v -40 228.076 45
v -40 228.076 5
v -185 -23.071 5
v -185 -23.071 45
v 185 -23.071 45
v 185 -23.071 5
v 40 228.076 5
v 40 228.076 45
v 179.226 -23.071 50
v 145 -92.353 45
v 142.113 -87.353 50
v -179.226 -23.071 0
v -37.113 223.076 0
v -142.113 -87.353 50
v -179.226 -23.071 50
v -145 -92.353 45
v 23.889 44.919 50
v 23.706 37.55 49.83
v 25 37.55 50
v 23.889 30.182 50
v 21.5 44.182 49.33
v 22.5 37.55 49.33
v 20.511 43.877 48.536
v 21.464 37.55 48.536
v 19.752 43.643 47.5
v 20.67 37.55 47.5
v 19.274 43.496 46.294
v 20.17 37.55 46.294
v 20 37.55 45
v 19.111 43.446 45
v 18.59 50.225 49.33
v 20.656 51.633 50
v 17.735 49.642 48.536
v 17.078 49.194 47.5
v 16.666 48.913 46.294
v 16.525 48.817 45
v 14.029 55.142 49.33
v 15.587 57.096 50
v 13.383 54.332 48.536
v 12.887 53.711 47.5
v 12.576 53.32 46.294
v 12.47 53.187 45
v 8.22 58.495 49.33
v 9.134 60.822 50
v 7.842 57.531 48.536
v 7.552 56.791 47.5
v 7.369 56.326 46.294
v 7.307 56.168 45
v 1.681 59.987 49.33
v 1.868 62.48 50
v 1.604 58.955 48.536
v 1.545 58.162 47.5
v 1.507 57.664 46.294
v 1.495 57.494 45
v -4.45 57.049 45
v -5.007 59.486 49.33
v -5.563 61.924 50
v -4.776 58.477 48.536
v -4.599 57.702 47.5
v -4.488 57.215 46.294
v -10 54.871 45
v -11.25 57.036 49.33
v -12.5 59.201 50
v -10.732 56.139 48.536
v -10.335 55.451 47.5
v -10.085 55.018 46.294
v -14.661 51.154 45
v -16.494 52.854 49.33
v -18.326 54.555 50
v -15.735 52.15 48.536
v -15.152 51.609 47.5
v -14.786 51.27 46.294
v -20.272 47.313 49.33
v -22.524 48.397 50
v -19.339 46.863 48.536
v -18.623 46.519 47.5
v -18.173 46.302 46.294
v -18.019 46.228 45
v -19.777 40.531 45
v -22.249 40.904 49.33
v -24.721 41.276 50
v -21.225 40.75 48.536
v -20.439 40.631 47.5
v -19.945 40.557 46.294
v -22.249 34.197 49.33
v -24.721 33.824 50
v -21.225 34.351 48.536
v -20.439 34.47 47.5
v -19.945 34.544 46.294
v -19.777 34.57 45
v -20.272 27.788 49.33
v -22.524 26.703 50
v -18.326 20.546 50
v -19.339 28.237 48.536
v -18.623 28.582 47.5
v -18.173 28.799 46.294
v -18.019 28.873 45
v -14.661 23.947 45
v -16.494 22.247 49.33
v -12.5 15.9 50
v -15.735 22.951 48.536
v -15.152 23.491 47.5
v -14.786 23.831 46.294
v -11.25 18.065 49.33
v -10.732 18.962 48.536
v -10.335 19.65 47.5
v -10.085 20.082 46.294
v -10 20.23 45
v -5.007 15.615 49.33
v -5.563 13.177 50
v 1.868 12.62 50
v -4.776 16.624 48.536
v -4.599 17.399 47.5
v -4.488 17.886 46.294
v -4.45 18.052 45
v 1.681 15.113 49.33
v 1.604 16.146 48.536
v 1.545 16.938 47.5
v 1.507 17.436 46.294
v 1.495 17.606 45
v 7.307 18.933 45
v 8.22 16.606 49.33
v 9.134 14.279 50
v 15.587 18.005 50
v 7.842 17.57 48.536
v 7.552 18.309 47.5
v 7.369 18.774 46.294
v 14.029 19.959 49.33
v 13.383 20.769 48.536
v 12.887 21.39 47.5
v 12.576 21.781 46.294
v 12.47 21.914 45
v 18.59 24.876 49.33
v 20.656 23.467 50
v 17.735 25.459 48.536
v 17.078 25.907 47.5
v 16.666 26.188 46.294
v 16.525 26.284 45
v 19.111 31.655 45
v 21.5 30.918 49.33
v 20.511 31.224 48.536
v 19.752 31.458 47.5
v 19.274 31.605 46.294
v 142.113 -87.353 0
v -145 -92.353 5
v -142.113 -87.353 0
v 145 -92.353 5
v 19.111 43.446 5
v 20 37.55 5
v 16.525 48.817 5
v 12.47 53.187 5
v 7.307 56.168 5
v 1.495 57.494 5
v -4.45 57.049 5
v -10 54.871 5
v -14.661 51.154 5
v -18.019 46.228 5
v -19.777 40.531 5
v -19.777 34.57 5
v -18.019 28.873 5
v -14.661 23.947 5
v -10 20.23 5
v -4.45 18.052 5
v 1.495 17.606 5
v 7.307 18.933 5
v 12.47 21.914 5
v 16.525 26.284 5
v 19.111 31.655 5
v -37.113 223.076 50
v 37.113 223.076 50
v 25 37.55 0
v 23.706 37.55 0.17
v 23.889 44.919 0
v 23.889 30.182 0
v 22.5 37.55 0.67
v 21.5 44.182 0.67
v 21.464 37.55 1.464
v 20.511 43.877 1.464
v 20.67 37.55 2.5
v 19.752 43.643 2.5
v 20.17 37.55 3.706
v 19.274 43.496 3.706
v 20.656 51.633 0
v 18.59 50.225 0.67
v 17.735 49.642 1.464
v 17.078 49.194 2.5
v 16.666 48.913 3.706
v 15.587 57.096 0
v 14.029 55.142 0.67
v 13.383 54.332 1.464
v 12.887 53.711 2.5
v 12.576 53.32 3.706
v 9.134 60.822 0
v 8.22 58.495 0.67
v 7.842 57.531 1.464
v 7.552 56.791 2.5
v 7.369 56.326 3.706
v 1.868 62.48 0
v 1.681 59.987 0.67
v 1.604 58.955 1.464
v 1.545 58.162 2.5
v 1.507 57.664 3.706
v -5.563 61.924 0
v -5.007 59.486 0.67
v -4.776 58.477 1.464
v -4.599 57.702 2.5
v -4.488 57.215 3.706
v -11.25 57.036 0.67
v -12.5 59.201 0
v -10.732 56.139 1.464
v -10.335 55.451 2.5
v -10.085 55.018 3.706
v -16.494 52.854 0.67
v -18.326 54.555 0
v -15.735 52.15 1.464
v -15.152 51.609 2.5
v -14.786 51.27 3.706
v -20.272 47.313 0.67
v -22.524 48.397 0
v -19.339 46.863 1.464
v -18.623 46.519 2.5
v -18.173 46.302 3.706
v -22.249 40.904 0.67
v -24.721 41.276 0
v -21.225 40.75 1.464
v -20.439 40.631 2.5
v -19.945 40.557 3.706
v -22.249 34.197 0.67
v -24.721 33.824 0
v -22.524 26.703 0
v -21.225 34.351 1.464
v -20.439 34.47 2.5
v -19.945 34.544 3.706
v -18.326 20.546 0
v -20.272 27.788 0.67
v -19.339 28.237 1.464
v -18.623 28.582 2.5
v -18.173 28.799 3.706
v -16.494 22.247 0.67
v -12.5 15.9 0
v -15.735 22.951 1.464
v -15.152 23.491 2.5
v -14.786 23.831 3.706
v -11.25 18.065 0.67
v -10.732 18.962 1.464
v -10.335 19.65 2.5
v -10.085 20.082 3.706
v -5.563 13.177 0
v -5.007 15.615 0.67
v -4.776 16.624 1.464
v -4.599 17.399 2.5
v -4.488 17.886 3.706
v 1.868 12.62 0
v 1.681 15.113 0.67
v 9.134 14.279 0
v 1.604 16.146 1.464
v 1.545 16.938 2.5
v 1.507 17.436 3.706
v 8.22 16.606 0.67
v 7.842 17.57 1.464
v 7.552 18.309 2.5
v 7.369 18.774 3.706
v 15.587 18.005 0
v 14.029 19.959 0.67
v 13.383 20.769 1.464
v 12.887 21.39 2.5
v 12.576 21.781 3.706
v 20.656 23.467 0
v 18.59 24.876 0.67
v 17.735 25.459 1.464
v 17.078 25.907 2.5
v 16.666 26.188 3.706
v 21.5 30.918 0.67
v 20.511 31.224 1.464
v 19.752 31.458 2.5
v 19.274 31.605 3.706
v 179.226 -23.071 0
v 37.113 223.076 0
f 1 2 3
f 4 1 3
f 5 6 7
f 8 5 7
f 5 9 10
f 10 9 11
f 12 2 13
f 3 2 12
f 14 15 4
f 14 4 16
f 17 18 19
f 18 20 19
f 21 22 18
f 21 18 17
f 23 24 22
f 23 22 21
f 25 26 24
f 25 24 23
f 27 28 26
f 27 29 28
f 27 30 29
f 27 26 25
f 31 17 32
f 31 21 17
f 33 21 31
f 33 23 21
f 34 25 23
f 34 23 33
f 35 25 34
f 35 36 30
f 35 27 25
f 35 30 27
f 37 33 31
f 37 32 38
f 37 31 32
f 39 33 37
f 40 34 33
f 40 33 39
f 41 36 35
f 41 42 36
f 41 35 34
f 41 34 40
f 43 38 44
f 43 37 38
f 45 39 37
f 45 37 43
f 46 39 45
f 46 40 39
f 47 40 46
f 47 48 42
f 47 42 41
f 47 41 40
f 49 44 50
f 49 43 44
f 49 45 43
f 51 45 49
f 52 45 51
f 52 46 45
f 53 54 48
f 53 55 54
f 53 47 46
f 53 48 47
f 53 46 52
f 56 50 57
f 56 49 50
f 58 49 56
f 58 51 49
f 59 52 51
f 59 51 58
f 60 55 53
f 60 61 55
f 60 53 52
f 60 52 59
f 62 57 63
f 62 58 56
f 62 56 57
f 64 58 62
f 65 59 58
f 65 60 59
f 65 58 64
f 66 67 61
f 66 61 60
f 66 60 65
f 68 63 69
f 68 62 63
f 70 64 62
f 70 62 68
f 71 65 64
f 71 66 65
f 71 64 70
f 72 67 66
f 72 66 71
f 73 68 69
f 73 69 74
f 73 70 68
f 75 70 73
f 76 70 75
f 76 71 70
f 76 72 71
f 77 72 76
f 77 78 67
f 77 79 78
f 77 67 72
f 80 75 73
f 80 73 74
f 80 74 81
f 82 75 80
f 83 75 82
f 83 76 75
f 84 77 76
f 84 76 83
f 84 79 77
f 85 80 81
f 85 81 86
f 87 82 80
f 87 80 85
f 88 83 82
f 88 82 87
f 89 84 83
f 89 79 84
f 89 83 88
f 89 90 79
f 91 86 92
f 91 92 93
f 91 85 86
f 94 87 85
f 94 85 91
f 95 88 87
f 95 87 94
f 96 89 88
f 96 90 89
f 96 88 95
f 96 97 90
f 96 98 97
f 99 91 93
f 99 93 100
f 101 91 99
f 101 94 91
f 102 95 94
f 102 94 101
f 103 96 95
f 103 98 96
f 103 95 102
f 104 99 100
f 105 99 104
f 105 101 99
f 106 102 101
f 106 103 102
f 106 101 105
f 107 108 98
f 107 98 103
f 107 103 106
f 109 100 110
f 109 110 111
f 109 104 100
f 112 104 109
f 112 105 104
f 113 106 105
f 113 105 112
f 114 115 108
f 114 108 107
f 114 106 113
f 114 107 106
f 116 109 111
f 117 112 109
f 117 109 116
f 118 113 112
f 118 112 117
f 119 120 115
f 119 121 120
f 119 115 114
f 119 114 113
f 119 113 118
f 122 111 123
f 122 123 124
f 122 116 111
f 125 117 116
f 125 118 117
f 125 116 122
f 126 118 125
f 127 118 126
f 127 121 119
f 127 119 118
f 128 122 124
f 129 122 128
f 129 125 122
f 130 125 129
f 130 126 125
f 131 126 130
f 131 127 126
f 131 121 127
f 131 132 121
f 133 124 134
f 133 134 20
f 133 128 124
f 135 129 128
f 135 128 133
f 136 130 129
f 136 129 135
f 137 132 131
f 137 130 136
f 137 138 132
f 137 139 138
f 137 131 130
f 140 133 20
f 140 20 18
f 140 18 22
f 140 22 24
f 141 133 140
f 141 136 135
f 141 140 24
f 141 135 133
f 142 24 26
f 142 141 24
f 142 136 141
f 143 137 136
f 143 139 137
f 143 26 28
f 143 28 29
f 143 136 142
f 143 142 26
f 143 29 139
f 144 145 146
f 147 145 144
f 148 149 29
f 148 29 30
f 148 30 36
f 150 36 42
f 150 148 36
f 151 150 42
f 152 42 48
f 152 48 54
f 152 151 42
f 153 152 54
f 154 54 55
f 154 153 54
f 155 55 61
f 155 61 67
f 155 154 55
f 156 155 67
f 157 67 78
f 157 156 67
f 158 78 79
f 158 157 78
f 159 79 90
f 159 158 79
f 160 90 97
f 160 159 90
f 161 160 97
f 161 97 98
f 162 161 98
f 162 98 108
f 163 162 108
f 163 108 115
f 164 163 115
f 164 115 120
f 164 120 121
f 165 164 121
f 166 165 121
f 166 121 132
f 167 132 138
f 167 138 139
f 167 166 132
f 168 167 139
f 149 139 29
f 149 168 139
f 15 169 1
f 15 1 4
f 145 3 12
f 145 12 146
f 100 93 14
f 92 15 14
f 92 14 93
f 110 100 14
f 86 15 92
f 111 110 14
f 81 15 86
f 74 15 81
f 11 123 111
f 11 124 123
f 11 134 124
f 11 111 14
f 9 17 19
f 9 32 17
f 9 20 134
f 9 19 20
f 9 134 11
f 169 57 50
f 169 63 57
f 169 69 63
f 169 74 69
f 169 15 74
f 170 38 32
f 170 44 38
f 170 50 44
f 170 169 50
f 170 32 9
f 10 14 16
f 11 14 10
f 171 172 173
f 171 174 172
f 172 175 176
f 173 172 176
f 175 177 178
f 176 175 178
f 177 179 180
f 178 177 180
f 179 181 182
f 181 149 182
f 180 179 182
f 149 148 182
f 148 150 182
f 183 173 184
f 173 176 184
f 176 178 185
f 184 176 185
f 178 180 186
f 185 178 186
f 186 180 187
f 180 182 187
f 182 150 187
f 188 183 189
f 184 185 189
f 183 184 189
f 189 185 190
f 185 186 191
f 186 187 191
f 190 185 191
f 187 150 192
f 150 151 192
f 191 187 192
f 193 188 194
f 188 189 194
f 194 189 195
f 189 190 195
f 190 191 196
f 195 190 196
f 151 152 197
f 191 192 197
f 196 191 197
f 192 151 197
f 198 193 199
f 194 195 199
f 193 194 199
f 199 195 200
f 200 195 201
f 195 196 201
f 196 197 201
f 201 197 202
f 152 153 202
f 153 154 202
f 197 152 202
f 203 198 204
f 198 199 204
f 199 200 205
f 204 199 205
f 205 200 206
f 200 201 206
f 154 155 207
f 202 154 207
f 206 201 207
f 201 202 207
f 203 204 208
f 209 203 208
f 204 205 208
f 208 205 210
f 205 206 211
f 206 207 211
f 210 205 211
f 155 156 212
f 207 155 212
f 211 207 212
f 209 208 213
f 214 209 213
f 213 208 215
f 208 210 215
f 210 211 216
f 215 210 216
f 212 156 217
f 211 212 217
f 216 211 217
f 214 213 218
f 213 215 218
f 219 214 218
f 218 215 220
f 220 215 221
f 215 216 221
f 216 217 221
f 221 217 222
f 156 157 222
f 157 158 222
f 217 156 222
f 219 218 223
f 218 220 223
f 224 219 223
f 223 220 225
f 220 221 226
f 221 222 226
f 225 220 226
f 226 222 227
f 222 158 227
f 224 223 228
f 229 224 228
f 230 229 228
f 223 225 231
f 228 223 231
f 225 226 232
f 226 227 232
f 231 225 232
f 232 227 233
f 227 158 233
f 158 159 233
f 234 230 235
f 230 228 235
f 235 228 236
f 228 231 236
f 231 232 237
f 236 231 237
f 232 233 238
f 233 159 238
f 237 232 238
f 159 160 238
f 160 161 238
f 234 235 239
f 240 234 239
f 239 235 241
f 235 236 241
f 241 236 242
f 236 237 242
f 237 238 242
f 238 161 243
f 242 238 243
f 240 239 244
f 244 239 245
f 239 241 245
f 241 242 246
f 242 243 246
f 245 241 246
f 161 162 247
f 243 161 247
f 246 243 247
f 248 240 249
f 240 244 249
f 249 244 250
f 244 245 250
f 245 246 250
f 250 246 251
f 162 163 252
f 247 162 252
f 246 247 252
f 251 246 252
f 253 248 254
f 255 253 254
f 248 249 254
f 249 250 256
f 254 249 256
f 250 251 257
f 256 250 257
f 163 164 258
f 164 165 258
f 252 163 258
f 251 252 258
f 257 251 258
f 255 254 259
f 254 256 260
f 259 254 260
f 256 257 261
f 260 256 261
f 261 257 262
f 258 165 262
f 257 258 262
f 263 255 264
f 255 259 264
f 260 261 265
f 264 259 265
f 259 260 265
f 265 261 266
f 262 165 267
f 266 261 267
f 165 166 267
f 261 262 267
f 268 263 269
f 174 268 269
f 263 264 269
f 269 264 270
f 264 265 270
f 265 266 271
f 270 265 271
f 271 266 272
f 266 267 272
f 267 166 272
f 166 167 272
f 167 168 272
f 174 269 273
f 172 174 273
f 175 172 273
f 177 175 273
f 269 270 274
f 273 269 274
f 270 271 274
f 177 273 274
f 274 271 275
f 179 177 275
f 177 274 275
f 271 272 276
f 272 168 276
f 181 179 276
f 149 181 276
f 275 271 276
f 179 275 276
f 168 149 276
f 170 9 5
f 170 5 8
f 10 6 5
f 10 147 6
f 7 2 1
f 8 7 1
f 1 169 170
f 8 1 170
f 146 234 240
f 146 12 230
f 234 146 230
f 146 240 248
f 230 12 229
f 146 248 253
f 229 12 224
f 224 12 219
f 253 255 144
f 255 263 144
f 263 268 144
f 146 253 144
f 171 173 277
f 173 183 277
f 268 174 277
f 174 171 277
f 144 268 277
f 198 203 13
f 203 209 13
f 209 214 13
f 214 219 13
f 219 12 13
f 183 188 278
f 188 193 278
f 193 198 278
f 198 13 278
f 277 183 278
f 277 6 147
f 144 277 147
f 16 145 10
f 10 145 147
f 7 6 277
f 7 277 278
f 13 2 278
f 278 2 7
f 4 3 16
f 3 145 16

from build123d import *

# Parameters (mm, degrees)
F0_R     = 20
F1_DEPTH = 50
F2_SIZE  = 80
F3_R     = 5
F4_SIZE  = 5


with BuildPart() as f1:
    # F0 (on Top) → F1 (new body)
    with BuildSketch(Plane.XY):
        Polygon((0, 297.3580189822), (-225, -92.3534127208), (225, -92.3534127208), align=None)
        with Locations((0, 37.5503978469)):
            Circle(F0_R, mode=Mode.SUBTRACT)
    extrude(amount=F1_DEPTH)

    # F2
    f2_edges = [f1.edges().sort_by_distance(p)[0] for p in [
        (225, -92.353413, 25),
        (-225, -92.353413, 25),
        (0, 297.358019, 25),
    ]]
    chamfer(f2_edges, length=F2_SIZE)

    # F3
    f3_edges = [f1.edges().sort_by_distance(p)[0] for p in [
        (-20, 37.550398, 50),
        (-20, 37.550398, 0),
    ]]
    fillet(f3_edges, radius=F3_R)

    # F4
    f4_edges = [f1.edges().sort_by_distance(p)[0] for p in [
        (112.5, 102.502303, 50),
        (165, -57.712397, 50),
        (0, -92.353413, 50),
        (-165, -57.712397, 50),
        (-112.5, 102.502303, 50),
        (165, -57.712397, 0),
        (0, -92.353413, 0),
        (112.5, 102.502303, 0),
        (-165, -57.712397, 0),
        (-112.5, 102.502303, 0),
        (0, 228.075987, 0),
        (0, 228.075987, 50),
    ]]
    chamfer(f4_edges, length=F4_SIZE)


solid = f1.part
